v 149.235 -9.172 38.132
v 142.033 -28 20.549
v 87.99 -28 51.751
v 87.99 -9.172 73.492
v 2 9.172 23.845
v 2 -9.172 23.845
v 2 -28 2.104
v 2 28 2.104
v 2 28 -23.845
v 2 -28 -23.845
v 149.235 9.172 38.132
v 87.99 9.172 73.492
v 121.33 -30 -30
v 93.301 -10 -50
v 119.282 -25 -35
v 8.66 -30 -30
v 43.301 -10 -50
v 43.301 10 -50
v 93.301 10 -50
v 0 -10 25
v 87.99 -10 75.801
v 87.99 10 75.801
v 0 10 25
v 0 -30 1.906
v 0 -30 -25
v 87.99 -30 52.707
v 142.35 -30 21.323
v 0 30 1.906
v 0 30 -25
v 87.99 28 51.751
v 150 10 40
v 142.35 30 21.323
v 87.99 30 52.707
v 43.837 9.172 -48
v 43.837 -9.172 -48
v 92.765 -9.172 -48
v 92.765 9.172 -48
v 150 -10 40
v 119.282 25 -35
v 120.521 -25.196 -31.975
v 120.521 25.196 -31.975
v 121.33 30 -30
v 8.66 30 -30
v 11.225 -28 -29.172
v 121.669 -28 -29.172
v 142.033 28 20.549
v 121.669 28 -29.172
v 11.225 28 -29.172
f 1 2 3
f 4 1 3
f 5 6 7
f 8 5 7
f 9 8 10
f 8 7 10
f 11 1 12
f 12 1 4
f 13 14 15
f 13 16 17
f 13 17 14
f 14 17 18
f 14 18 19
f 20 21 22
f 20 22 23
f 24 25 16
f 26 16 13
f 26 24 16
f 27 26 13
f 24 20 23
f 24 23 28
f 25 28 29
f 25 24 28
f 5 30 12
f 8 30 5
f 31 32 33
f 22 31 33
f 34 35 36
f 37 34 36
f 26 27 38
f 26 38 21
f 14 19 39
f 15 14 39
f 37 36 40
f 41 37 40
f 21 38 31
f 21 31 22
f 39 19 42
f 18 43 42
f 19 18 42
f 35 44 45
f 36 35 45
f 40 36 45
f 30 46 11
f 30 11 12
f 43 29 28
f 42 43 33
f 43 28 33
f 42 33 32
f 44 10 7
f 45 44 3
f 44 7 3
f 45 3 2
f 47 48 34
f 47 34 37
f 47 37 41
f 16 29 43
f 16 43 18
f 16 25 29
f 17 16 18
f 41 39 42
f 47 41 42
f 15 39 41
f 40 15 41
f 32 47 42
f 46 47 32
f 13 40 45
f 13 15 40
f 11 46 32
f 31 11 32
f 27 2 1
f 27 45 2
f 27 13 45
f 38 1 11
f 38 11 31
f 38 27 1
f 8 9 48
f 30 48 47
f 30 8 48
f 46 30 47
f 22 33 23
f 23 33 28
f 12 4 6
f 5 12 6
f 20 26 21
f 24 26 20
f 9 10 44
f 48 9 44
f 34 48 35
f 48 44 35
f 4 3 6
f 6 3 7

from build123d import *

# Parameters (mm, degrees)
F1_DEPTH = 30
F2_SIZE  = 20
F3_T     = -2


with BuildPart() as f1:
    # F0 (on Front) → F1 (new body, symmetric)
    with BuildSketch(Plane.XZ):
        Polygon((0, 25), (0, -25), (43.3012701892, -50), (93.3012701892, -50), (119.2820323028, -35), (150, 40), (87.9903810568, 75.8012701892), align=None)
    extrude(amount=F1_DEPTH, both=True)

    # F2
    f2_edges = [f1.edges().sort_by_distance(p)[0] for p in [
        (68.30127, -30, -50),
        (68.30127, 30, -50),
        (43.995191, -30, 50.400635),
        (118.995191, -30, 57.900635),
        (118.995191, 30, 57.900635),
        (43.995191, 30, 50.400635),
    ]]
    chamfer(f2_edges, length=F2_SIZE)

    # F3
    f3_openings = [f1.faces().sort_by_distance(p)[0] for p in [
        (133.563862, 0, -0.129945),
    ]]
    offset(amount=F3_T, openings=f3_openings)


solid = f1.part
